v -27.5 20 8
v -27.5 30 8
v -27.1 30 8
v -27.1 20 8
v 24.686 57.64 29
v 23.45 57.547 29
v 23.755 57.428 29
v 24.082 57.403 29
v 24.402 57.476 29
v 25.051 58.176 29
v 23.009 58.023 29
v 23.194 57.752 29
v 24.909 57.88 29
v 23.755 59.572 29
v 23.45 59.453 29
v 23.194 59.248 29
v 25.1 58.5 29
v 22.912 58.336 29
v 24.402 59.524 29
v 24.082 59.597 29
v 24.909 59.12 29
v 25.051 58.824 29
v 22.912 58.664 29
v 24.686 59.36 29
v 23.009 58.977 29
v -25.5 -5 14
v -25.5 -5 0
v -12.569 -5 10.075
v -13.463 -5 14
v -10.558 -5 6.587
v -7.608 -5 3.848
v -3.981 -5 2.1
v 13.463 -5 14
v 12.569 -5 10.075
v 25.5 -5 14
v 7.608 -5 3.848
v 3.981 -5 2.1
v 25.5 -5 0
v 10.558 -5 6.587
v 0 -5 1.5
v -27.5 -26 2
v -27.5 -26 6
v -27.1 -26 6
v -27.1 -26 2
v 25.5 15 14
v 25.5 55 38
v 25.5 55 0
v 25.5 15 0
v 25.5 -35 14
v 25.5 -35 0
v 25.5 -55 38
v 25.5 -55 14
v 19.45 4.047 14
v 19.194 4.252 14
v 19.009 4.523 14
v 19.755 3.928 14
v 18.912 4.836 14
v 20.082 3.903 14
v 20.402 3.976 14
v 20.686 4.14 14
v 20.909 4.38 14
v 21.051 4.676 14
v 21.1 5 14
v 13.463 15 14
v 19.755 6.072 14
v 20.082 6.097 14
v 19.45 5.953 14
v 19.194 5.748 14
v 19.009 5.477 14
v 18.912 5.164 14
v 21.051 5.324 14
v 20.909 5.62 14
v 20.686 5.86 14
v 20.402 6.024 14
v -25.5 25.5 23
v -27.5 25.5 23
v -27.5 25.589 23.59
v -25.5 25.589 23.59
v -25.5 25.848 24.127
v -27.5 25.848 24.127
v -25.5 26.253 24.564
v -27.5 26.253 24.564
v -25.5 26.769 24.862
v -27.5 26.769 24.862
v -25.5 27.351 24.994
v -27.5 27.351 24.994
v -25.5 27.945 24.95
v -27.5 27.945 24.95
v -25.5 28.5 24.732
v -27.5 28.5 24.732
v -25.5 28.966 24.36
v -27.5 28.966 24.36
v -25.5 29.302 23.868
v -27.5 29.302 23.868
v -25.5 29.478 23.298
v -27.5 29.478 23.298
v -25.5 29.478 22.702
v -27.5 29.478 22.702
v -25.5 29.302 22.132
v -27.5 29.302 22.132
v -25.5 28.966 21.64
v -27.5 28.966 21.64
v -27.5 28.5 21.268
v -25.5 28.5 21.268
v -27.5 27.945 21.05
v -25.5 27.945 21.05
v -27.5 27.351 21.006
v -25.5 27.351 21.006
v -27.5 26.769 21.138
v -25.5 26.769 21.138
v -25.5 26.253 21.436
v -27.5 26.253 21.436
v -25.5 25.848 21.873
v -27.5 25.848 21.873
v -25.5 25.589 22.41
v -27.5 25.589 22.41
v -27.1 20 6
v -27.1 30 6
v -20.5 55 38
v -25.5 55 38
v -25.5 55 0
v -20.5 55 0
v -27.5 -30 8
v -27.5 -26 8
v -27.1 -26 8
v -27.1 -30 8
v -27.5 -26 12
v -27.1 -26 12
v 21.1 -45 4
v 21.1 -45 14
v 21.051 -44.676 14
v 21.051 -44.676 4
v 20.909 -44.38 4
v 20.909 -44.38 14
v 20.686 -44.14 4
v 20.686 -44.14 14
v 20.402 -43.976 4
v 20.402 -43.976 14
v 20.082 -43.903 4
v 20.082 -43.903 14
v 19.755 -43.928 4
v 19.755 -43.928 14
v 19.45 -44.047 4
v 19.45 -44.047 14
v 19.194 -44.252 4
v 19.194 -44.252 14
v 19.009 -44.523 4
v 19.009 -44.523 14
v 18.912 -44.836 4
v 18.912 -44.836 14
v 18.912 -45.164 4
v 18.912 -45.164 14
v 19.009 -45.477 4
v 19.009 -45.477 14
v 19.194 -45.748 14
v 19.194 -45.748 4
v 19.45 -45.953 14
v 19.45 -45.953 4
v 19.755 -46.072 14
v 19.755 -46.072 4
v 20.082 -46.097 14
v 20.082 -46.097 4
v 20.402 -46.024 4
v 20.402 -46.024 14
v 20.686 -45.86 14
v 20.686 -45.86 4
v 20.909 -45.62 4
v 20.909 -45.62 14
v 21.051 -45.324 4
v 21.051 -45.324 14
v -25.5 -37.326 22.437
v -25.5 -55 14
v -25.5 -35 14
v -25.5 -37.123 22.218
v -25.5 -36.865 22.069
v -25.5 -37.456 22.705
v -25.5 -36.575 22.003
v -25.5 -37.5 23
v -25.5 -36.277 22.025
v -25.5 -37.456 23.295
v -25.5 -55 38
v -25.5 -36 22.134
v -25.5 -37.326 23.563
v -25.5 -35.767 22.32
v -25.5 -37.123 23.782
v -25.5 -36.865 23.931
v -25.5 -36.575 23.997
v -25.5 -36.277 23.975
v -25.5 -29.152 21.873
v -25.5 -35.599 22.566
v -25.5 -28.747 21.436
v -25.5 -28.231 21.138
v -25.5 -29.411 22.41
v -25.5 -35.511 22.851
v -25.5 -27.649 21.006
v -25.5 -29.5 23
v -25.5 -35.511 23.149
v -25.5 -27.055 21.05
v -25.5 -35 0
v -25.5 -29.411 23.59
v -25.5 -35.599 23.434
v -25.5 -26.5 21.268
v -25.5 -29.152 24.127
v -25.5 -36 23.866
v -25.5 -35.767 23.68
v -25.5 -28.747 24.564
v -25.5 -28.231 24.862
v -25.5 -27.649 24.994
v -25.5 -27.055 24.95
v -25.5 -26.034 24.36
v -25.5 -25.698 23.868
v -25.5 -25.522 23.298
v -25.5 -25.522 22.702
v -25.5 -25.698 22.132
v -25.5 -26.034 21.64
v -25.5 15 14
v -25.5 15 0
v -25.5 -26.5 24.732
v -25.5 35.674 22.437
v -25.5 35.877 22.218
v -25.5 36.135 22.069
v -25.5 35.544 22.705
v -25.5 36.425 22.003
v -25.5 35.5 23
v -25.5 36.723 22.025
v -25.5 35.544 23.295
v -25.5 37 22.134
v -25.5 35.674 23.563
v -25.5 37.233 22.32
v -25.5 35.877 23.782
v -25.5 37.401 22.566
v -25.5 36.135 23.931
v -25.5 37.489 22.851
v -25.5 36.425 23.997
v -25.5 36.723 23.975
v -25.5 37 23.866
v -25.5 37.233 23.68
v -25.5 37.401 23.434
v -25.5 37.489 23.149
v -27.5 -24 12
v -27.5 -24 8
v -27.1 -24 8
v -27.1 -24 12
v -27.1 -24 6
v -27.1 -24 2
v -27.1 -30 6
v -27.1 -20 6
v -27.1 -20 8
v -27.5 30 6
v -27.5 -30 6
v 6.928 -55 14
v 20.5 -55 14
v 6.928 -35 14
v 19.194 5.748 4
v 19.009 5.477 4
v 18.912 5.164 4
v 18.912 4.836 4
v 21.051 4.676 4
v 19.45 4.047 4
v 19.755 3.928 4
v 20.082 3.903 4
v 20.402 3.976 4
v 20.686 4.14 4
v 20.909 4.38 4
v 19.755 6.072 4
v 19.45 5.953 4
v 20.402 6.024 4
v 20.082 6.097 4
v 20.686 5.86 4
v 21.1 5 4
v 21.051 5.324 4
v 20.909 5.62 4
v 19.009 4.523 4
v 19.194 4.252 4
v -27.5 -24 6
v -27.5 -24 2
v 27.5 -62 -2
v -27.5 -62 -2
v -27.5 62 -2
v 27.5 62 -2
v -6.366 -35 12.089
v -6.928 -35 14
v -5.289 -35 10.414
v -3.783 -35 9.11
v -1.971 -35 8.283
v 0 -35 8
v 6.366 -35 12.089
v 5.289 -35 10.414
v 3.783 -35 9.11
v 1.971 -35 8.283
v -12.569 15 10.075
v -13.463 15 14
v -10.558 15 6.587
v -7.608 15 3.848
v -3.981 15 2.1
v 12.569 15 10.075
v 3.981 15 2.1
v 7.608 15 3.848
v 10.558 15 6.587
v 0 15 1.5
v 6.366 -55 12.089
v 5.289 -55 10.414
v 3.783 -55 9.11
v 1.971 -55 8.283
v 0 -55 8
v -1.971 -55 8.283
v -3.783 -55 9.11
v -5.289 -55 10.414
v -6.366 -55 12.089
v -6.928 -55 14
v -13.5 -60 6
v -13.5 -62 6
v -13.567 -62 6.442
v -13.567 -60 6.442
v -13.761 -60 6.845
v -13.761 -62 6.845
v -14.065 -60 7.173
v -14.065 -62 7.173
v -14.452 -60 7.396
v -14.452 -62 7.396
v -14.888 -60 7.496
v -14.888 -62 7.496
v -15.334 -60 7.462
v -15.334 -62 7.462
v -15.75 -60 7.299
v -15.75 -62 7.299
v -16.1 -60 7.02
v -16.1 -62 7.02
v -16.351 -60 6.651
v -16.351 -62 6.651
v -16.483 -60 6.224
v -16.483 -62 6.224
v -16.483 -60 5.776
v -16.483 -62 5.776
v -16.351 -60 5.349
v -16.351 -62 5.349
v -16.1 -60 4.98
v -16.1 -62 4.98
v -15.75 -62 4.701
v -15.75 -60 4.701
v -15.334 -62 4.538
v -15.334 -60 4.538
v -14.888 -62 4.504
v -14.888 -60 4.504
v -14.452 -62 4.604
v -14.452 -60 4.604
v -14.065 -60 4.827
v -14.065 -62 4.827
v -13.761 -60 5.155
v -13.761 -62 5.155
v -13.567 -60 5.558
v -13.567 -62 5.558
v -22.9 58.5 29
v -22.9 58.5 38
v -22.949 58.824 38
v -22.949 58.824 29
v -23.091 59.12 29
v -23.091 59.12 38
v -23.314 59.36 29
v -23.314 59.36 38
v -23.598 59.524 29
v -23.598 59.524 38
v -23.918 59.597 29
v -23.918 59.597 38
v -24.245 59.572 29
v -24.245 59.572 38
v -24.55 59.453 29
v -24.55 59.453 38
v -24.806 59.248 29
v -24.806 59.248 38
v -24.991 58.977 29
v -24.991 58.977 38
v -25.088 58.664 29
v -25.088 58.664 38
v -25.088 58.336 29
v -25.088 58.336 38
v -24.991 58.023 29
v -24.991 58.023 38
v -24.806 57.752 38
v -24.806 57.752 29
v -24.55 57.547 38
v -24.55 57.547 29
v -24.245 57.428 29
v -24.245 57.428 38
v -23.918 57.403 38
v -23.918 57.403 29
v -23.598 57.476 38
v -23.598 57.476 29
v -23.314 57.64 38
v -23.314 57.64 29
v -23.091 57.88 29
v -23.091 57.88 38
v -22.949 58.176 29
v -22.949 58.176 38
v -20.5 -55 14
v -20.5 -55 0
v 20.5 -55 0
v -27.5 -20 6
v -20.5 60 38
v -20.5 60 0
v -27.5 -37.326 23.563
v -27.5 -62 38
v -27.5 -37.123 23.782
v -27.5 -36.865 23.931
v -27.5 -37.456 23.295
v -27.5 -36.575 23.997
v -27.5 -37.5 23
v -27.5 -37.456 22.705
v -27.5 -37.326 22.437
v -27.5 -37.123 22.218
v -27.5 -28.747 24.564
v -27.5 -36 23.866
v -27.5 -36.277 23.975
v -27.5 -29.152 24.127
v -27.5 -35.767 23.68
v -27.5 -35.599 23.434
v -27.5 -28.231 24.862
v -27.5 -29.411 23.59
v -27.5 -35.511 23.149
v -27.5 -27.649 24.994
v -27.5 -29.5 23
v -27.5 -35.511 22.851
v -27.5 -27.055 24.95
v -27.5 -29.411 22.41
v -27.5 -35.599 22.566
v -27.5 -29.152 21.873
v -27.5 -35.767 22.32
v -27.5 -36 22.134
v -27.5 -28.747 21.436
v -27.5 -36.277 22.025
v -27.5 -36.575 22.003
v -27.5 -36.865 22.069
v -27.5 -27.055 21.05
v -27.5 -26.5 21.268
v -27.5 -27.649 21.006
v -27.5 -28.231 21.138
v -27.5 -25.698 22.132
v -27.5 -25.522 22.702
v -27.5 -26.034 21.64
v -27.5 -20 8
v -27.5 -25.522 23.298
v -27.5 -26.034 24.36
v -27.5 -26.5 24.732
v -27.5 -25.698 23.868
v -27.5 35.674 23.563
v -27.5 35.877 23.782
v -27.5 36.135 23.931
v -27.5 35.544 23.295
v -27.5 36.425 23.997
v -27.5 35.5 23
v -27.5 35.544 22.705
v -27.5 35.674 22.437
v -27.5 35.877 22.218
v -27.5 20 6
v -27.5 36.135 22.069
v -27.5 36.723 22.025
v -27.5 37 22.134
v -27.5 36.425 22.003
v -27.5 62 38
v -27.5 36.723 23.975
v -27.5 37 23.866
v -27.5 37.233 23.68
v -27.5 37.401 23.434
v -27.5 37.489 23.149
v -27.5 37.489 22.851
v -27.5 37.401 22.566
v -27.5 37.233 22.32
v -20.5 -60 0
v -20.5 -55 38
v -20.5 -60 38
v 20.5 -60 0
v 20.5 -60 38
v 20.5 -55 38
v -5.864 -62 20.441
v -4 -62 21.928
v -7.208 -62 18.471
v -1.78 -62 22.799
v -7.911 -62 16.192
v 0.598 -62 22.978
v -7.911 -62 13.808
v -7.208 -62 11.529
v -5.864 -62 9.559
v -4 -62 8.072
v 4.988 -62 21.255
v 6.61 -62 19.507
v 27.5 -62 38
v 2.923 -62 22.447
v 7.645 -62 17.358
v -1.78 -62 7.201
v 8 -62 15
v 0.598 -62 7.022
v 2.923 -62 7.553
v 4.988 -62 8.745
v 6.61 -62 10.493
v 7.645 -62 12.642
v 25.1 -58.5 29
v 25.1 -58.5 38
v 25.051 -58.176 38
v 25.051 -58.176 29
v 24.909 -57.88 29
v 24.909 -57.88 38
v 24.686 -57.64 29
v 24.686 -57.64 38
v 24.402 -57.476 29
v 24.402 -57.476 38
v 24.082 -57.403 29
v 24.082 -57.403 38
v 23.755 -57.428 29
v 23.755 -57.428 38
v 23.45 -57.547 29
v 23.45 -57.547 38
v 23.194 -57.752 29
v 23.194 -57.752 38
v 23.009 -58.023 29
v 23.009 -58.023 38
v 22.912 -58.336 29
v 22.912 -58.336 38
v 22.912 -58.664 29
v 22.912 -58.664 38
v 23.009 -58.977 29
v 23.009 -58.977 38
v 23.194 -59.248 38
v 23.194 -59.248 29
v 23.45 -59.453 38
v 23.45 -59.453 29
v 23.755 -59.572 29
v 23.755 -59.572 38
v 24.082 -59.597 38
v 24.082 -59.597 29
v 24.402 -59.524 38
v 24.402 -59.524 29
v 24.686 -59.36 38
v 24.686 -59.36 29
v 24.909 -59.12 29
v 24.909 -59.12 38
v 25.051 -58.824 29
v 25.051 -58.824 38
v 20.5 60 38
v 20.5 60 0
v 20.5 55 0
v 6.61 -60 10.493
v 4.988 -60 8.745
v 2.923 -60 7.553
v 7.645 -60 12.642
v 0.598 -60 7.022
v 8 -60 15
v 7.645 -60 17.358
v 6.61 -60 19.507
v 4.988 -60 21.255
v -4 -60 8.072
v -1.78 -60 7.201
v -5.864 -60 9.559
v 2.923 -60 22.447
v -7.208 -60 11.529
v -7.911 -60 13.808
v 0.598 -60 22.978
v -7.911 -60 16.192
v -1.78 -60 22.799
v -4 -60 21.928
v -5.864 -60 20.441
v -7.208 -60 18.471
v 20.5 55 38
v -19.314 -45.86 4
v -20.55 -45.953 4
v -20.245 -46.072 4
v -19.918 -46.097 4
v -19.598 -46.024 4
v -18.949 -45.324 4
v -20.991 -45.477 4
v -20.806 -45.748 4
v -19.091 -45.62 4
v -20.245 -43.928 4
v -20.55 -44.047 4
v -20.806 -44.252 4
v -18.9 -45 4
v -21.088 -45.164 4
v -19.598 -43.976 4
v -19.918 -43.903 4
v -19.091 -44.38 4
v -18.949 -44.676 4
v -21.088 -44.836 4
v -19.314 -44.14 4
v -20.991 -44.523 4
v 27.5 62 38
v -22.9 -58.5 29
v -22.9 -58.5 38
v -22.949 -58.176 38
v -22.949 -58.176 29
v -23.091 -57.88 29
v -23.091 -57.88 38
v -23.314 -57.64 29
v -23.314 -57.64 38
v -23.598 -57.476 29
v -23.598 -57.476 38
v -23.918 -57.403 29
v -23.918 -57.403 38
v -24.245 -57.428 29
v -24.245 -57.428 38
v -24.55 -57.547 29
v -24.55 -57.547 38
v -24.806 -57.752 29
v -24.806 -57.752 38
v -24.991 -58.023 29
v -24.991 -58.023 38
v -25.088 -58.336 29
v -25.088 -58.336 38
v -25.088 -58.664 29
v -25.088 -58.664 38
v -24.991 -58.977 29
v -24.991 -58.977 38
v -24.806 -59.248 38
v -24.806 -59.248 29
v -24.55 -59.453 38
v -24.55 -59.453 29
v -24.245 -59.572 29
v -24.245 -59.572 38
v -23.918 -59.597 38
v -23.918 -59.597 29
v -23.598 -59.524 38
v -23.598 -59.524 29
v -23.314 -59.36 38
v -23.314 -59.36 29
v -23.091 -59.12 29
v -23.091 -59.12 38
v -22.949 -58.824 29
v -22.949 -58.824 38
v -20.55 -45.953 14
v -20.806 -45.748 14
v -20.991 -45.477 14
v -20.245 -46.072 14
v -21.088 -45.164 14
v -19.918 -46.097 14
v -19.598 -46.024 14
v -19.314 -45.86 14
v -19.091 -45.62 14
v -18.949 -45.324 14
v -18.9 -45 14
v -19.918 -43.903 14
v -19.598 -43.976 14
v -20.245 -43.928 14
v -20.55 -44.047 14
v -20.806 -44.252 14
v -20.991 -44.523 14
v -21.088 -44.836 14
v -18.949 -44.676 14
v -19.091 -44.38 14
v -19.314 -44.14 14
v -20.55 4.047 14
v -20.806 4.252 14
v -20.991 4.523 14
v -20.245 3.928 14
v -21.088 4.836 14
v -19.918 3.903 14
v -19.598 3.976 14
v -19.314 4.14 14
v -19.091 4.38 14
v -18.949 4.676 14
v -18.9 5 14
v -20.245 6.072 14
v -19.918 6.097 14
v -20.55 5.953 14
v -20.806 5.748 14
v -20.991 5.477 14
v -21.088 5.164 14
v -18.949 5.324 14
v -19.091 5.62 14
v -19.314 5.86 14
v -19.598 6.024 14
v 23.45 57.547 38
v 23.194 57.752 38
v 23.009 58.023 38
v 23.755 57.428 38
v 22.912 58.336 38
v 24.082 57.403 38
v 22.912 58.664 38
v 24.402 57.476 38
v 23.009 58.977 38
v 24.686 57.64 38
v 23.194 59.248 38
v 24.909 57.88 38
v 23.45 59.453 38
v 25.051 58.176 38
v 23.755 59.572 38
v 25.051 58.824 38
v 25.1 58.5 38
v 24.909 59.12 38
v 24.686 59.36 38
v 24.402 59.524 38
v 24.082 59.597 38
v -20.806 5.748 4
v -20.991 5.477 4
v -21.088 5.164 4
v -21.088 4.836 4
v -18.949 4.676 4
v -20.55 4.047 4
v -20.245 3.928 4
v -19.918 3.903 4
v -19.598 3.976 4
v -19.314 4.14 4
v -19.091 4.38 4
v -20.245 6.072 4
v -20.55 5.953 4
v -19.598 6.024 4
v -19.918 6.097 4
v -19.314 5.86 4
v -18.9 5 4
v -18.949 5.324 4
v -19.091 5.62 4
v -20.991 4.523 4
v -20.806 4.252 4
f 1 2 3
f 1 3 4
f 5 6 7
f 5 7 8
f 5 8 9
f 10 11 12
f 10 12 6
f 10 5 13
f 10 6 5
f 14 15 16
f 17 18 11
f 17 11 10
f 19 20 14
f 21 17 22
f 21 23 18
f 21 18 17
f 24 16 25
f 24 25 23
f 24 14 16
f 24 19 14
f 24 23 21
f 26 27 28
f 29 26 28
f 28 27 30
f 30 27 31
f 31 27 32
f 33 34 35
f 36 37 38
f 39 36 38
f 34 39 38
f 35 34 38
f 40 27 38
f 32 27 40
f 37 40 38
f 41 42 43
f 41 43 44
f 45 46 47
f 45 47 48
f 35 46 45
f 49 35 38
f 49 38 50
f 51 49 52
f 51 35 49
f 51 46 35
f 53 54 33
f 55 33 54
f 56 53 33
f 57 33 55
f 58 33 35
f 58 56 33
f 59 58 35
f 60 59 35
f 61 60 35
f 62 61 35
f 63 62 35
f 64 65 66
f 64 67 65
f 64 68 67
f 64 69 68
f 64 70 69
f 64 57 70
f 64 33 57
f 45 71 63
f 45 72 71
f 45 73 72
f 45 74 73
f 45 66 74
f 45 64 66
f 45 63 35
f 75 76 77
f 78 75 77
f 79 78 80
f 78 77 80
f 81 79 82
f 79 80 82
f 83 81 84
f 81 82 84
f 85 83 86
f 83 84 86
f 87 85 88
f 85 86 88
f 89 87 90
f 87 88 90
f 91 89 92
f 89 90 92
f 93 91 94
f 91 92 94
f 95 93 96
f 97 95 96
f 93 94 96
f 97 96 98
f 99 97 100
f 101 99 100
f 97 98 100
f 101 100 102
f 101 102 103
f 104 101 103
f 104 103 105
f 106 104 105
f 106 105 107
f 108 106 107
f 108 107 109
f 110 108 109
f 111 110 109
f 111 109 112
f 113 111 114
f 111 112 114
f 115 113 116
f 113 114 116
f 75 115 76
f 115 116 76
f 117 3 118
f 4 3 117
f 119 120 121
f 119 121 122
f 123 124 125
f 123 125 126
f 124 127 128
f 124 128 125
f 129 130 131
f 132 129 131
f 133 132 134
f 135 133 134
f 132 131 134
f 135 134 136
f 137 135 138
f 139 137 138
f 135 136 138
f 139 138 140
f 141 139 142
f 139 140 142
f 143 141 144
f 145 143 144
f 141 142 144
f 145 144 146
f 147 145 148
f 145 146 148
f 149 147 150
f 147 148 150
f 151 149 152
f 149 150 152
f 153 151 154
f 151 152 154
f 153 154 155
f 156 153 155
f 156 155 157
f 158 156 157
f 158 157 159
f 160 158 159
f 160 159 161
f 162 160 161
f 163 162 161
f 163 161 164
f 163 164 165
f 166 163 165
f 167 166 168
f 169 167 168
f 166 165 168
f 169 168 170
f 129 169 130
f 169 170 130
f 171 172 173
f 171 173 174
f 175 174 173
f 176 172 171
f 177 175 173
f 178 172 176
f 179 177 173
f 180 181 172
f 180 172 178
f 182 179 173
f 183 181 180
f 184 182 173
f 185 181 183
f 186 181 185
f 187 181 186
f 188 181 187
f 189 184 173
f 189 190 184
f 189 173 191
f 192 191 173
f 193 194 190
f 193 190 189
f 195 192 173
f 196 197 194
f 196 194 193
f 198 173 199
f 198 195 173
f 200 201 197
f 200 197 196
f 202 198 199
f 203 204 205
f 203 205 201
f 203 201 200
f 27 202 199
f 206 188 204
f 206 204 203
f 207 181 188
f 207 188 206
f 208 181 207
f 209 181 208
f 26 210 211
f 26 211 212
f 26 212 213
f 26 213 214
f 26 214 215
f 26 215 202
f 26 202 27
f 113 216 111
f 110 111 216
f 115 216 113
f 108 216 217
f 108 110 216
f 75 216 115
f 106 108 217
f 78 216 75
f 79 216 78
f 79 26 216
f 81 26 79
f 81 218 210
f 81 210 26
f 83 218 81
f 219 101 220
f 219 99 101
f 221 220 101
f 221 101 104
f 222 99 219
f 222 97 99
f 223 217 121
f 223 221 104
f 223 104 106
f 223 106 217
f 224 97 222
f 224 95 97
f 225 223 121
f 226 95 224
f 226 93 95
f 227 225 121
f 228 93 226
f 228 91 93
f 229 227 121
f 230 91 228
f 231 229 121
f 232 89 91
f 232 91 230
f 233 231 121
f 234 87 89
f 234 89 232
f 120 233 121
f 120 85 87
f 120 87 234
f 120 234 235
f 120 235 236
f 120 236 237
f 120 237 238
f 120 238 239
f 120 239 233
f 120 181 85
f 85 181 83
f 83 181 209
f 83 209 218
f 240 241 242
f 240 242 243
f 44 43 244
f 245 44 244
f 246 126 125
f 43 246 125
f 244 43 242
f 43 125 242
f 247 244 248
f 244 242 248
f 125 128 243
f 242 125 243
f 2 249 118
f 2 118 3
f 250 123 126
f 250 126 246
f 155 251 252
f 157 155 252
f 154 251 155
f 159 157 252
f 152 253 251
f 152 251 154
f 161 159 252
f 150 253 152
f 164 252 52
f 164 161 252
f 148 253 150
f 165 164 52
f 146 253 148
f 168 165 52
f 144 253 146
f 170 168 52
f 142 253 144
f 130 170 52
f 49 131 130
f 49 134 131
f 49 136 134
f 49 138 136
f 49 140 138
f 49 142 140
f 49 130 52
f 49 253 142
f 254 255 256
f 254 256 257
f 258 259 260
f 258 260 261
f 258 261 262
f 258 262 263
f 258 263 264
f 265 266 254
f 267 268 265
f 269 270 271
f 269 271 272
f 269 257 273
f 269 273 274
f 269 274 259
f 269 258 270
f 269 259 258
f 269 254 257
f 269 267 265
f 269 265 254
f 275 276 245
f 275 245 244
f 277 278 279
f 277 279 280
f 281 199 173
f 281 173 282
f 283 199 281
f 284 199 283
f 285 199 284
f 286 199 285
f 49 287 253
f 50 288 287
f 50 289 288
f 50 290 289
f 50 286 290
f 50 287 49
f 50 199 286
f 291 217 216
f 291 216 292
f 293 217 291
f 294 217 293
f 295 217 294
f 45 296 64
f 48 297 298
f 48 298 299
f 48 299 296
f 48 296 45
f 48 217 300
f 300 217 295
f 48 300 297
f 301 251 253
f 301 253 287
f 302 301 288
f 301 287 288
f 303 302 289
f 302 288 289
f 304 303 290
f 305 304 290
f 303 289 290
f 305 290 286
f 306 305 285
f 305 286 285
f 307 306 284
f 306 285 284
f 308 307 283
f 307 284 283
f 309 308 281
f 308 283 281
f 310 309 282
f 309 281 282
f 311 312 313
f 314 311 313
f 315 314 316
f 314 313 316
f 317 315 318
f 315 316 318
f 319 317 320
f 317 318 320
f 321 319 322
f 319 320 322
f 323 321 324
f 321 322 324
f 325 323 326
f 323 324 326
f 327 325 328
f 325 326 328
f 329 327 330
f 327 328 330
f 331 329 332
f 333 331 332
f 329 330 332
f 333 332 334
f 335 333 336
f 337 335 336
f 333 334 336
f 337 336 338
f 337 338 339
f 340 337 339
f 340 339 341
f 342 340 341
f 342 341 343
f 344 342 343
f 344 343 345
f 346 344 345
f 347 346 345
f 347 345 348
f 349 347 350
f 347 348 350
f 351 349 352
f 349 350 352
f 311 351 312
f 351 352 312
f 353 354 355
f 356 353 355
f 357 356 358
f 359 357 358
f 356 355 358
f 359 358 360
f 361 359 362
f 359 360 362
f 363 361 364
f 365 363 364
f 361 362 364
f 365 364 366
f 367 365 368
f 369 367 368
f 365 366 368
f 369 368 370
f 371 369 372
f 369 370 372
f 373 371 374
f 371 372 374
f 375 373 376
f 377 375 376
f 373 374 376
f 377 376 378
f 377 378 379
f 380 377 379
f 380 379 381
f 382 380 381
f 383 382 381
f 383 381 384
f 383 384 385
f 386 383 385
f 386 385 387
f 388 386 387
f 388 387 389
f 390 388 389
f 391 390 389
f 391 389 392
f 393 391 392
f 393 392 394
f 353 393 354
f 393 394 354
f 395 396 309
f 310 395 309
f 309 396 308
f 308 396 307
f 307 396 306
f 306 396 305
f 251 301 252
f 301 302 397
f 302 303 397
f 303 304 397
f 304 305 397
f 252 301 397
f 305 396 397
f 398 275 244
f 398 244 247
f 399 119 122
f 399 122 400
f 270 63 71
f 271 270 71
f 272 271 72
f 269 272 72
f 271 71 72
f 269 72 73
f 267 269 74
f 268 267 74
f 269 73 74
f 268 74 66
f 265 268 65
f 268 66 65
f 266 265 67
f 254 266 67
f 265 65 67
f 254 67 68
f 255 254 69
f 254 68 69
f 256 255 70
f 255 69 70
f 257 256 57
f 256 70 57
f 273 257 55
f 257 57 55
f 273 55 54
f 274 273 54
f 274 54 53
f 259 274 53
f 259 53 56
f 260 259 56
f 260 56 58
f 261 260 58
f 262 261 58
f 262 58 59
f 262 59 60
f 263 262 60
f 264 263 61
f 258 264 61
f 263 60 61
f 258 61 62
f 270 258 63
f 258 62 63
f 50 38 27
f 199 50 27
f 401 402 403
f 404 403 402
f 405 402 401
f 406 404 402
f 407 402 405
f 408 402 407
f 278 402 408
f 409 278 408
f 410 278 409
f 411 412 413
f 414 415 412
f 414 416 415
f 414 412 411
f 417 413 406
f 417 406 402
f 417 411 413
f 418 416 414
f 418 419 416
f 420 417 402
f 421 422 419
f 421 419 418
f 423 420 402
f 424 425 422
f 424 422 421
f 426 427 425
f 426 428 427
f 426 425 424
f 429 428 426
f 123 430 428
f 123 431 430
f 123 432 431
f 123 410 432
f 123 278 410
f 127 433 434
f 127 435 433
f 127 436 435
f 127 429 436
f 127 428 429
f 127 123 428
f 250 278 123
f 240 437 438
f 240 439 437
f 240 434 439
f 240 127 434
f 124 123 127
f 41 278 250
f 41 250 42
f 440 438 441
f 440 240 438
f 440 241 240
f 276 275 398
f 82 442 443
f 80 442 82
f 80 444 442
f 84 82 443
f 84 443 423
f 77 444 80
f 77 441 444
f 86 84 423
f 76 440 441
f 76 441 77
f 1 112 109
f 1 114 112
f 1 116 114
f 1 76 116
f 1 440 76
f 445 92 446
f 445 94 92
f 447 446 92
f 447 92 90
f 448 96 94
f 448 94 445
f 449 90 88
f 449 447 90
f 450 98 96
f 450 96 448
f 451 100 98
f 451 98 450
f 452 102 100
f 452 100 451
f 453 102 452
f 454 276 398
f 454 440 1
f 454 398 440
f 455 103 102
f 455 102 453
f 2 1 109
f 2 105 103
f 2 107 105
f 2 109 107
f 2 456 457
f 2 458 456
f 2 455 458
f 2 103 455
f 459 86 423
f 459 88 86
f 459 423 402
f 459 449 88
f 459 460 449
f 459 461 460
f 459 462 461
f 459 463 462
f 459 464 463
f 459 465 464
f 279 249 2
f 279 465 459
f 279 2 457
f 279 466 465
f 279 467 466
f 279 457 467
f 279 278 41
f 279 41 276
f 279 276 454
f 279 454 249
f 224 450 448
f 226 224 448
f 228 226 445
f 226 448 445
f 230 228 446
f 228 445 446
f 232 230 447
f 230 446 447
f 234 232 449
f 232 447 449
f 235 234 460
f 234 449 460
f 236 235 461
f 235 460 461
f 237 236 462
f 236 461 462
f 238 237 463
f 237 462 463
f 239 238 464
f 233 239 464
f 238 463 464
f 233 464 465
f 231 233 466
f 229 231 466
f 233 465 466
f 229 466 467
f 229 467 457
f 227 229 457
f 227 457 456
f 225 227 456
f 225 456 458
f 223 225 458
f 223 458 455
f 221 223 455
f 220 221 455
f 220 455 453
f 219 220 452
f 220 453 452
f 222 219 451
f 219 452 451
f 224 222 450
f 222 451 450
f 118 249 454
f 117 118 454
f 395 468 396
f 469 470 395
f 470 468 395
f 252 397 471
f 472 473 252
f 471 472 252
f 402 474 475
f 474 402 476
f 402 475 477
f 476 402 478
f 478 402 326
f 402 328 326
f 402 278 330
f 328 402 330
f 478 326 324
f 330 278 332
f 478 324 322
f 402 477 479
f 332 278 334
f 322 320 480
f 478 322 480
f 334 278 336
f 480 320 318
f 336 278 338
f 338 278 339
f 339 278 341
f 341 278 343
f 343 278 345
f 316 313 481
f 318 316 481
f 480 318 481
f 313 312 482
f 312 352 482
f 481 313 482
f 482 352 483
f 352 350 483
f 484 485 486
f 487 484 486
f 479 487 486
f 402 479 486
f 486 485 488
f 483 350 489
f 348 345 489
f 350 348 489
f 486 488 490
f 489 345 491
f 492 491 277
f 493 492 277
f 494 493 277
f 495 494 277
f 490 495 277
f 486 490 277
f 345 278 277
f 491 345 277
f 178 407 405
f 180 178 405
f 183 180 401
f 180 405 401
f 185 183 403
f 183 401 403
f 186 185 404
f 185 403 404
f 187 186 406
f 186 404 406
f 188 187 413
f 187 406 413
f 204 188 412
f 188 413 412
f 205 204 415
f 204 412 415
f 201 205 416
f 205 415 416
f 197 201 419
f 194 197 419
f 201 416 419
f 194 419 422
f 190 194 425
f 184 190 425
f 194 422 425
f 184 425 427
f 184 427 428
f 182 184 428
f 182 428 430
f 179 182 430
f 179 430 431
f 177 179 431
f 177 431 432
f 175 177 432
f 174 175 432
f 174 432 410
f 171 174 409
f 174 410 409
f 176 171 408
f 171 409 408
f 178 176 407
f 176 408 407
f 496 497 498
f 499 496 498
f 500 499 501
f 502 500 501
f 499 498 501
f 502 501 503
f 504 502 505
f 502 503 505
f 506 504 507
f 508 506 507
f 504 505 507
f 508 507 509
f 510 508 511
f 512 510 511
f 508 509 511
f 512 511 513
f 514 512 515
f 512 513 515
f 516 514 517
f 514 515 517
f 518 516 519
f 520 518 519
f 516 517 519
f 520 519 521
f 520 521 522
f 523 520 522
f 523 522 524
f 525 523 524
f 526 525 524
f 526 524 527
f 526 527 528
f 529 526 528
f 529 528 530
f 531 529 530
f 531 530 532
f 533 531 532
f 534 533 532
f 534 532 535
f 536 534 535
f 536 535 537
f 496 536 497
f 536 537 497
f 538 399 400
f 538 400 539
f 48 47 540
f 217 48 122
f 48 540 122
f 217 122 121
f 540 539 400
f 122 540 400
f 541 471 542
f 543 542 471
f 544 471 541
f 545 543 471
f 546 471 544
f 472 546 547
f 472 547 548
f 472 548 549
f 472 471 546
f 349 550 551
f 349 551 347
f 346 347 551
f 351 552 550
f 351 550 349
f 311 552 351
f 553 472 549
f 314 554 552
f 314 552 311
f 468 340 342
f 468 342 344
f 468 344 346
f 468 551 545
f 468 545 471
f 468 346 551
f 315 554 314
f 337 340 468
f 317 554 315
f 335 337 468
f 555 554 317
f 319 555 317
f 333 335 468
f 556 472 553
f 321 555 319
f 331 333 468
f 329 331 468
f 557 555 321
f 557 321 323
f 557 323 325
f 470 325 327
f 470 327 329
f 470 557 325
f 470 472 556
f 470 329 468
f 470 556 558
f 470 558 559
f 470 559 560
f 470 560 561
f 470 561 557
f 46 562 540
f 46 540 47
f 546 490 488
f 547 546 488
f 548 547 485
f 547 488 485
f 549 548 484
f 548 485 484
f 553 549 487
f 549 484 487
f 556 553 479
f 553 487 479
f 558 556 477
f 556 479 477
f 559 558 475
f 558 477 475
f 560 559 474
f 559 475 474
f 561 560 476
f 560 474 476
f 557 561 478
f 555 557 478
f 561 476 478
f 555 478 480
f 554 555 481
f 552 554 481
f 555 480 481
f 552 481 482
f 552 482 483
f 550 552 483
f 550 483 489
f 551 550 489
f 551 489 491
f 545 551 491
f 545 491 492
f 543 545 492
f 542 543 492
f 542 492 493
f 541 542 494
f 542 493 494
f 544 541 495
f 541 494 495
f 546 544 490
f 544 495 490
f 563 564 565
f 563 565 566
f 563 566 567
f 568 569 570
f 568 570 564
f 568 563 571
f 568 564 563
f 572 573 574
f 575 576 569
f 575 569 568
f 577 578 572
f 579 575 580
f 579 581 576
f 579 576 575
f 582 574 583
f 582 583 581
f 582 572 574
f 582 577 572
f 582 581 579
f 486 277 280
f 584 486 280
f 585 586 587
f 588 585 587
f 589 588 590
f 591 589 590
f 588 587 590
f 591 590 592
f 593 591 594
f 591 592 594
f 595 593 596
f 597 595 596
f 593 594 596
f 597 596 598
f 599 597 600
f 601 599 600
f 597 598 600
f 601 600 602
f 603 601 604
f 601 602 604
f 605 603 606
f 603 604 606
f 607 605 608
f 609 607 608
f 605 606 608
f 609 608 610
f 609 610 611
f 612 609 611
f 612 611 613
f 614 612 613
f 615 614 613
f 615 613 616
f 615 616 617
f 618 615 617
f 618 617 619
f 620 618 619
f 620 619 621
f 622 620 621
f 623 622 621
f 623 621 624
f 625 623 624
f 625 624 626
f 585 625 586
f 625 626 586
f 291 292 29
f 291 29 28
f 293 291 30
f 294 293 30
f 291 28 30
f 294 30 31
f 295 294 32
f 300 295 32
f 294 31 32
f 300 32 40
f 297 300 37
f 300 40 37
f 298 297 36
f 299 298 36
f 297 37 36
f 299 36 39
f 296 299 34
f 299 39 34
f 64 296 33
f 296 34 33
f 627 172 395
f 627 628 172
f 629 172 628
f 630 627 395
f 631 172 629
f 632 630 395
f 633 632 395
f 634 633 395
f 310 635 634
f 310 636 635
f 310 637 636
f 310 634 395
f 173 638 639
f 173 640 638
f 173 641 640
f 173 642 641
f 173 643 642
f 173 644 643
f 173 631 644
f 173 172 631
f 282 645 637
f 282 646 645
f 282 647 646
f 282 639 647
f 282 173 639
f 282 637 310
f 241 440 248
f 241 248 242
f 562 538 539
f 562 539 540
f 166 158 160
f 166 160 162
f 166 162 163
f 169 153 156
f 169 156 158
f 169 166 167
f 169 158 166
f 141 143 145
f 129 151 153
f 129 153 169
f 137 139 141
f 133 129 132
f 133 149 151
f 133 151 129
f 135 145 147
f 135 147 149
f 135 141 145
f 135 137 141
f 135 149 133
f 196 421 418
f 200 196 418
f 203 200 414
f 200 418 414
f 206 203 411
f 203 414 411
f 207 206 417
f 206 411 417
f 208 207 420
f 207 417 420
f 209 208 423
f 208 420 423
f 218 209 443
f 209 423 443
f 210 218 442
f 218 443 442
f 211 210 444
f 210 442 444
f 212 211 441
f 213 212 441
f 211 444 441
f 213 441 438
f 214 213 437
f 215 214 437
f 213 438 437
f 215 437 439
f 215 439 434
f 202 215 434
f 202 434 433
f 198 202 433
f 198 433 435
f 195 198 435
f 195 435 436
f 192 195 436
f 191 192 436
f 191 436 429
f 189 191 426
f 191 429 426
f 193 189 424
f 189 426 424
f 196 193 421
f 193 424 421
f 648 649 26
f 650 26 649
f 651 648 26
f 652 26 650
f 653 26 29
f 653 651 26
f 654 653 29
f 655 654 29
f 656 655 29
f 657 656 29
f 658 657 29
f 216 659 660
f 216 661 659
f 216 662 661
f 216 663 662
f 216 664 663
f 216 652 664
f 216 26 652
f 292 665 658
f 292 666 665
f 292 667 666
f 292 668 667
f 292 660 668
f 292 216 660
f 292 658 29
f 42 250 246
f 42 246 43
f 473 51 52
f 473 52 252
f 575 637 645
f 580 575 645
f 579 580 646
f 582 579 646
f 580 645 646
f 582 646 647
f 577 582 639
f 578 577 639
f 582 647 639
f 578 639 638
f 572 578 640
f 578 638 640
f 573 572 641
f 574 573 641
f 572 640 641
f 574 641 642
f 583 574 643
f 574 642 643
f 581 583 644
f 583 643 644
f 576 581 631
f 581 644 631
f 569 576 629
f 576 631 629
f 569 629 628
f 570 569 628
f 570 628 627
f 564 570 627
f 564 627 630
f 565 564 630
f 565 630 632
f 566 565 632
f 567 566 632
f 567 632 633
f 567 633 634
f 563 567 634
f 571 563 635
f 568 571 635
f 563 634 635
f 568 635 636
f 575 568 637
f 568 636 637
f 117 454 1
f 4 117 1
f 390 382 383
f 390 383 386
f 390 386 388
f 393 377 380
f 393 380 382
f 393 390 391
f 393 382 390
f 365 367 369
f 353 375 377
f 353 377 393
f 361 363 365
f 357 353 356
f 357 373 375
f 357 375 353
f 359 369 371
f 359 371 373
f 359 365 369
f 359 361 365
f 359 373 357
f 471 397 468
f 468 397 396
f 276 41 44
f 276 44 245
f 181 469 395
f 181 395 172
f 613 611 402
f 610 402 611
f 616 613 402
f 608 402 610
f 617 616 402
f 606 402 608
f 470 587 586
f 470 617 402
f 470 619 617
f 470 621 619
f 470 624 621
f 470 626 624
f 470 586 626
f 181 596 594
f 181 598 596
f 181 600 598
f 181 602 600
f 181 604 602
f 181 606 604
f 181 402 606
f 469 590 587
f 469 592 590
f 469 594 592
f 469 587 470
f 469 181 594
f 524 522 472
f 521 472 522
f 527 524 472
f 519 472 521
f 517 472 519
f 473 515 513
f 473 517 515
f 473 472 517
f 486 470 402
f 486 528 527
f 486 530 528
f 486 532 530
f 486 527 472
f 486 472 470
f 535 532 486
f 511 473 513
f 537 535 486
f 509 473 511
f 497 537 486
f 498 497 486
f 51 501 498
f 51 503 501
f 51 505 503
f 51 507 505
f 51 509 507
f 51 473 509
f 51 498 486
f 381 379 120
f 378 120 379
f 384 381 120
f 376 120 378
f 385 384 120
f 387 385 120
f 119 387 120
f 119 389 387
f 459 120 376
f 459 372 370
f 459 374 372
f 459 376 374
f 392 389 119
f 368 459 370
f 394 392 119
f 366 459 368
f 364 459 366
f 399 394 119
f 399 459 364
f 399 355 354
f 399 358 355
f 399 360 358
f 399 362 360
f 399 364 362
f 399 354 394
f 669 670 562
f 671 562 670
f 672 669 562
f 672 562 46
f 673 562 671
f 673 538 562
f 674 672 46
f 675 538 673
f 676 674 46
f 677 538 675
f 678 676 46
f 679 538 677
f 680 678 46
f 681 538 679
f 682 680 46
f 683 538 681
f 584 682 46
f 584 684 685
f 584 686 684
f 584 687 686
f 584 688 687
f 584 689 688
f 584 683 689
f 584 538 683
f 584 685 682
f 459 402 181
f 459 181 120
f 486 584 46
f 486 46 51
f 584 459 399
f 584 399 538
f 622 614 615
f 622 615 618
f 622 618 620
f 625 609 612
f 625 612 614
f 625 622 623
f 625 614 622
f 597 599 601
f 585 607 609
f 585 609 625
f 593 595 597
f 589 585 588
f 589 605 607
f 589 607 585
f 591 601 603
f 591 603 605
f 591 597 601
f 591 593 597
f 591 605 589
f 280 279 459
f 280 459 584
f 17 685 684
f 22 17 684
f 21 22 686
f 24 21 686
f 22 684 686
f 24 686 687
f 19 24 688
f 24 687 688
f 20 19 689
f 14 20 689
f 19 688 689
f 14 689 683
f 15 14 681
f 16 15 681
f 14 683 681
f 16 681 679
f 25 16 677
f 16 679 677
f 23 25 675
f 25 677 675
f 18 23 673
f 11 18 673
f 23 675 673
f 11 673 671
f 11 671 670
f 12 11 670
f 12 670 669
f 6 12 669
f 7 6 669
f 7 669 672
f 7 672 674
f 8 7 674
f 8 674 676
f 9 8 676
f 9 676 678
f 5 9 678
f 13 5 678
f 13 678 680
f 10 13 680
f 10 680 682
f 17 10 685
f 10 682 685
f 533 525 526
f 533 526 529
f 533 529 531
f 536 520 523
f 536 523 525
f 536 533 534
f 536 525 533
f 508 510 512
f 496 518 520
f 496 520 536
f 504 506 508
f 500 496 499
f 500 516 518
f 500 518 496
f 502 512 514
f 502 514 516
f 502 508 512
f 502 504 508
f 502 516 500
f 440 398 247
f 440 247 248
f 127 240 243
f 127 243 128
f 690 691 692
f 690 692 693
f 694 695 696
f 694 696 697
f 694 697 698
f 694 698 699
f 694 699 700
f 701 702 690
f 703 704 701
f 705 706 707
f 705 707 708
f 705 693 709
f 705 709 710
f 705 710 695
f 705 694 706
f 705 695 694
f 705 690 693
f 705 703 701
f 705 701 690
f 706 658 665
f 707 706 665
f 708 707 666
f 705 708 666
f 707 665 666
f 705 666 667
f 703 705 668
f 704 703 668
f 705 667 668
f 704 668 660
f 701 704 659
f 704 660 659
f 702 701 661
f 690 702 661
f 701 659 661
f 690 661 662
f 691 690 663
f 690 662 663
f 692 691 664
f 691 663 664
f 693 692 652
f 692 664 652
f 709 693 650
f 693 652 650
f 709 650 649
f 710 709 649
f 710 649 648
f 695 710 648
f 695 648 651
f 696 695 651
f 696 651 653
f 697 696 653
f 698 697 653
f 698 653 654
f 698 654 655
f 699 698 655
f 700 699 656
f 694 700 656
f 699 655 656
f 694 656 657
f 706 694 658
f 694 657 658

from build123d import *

# Parameters (mm, degrees)
SKETCH006_W     = 55
SKETCH006_H     = 124
PAD002_DEPTH    = 40
POCKET004_DEPTH = 38
SKETCH008_R     = 8
POCKET005_DEPTH = 2
SKETCH009_R     = 1.1
POCKET006_DEPTH = 9
SKETCH012_R     = 2
SKETCH012_R_2   = 1
POCKET008_DEPTH = 2
SKETCH013_R     = 1.5
POCKET009_DEPTH = 2
SKETCH016_W     = 10
SKETCH016_H     = 2
POCKET011_DEPTH = 0.4
SKETCH019_W     = 51
SKETCH019_H     = 20
PAD005_DEPTH    = 14
SKETCH020_R     = 13.5
POCKET014_DEPTH = 20
SKETCH021_R     = 7
POCKET015_DEPTH = 20
SKETCH022_R     = 1.1
POCKET016_DEPTH = 10


with BuildPart() as part:
    # Sketch006 → Pad002 (new body)
    with BuildSketch(Plane.XY):
        Rectangle(SKETCH006_W, SKETCH006_H)
    extrude(amount=PAD002_DEPTH)

    # Sketch007 (on Face6 of Pad002) → Pocket004 (cut)
    with BuildSketch(Plane.XY.offset(40)):
        Polygon((-25.5, 55), (-20.5, 55), (-20.5, 60), (20.5, 60), (20.5, 55), (25.5, 55), (25.5, -55), (20.5, -55), (20.5, -60), (-20.5, -60), (-20.5, -55), (-25.5, -55), align=None)
    extrude(amount=-POCKET004_DEPTH, mode=Mode.SUBTRACT)

    # Sketch008 (on Face6 of Pocket004) → Pocket005 (cut)
    with BuildSketch(Plane.XZ.offset(62)):
        with Locations((0, 17)):
            Circle(SKETCH008_R)
    extrude(amount=-POCKET005_DEPTH, mode=Mode.SUBTRACT)

    # Sketch009 (on Face5 of Pocket005) → Pocket006 (cut)
    with BuildSketch(Plane.XY.offset(40)):
        with Locations((-24, 58.5)):
            Circle(SKETCH009_R)
        with Locations((24, 58.5)):
            Circle(SKETCH009_R)
        with Locations((24, -58.5)):
            Circle(SKETCH009_R)
        with Locations((-24, -58.5)):
            Circle(SKETCH009_R)
    extrude(amount=-POCKET006_DEPTH, mode=Mode.SUBTRACT)

    # Sketch012 (on Face2 of Pocket006) → Pocket008 (cut)
    with BuildSketch(Plane(origin=(-27.5, 0, 0), x_dir=(0, -1, 0), z_dir=(-1, 0, 0))):
        with Locations((-27.5, 25)):
            Circle(SKETCH012_R)
        with Locations((27.5, 25)):
            Circle(SKETCH012_R)
        with Locations((-36.5, 25)):
            Circle(SKETCH012_R_2)
        with Locations((36.5, 25)):
            Circle(SKETCH012_R_2)
    extrude(amount=-POCKET008_DEPTH, mode=Mode.SUBTRACT)

    # Sketch013 (on Face6 of Pocket008) → Pocket009 (cut)
    with BuildSketch(Plane.XZ.offset(62)):
        with Locations((-15, 8)):
            Circle(SKETCH013_R)
    extrude(amount=-POCKET009_DEPTH, mode=Mode.SUBTRACT)

    # Sketch016 (on Face2 of Pocket009) → Pocket011 (cut)
    with BuildSketch(Plane(origin=(-27.5, 0, 0), x_dir=(0, -1, 0), z_dir=(-1, 0, 0))):
        with Locations((-25, 9)):
            Rectangle(SKETCH016_W, SKETCH016_H)
        Polygon((20, 10), (24, 10), (24, 14), (26, 14), (26, 10), (30, 10), (30, 8), (26, 8), (26, 4), (24, 4), (24, 8), (20, 8), align=None)
    extrude(amount=-POCKET011_DEPTH, mode=Mode.SUBTRACT)

    # Sketch019 (on Face50 of Pocket011) → Pad005 (join)
    with BuildSketch(Plane.XY.offset(2)):
        with Locations((0, 5)):
            Rectangle(SKETCH019_W, SKETCH019_H)
        with Locations((0, -45)):
            Rectangle(SKETCH019_W, SKETCH019_H)
    extrude(amount=PAD005_DEPTH)

    # Sketch020 (on Face53 of Pad005) → Pocket014 (cut)
    with BuildSketch(Plane.XZ.offset(5)):
        with Locations((0, 17)):
            Circle(SKETCH020_R)
    extrude(amount=-POCKET014_DEPTH, mode=Mode.SUBTRACT)

    # Sketch021 (on Face55 of Pad005) → Pocket015 (cut)
    with BuildSketch(Plane(origin=(0, -35, 0), x_dir=(-1, 0, 0), z_dir=(0, 1, 0))):
        with Locations((0, 17)):
            Circle(SKETCH021_R)
    extrude(amount=-POCKET015_DEPTH, mode=Mode.SUBTRACT)

    # Sketch022 (on Face60 of Pocket015) → Pocket016 (cut)
    with BuildSketch(Plane.XY.offset(16)):
        with Locations((-20, 5)):
            Circle(SKETCH022_R)
        with Locations((20, 5)):
            Circle(SKETCH022_R)
        with Locations((-20, -45)):
            Circle(SKETCH022_R)
        with Locations((20, -45)):
            Circle(SKETCH022_R)
    extrude(amount=-POCKET016_DEPTH, mode=Mode.SUBTRACT)


with BuildPart() as part_1:
    # Body002 placement: moved
    add(part.part.moved(Location((0, 0, -2))))


solid = part_1.part
